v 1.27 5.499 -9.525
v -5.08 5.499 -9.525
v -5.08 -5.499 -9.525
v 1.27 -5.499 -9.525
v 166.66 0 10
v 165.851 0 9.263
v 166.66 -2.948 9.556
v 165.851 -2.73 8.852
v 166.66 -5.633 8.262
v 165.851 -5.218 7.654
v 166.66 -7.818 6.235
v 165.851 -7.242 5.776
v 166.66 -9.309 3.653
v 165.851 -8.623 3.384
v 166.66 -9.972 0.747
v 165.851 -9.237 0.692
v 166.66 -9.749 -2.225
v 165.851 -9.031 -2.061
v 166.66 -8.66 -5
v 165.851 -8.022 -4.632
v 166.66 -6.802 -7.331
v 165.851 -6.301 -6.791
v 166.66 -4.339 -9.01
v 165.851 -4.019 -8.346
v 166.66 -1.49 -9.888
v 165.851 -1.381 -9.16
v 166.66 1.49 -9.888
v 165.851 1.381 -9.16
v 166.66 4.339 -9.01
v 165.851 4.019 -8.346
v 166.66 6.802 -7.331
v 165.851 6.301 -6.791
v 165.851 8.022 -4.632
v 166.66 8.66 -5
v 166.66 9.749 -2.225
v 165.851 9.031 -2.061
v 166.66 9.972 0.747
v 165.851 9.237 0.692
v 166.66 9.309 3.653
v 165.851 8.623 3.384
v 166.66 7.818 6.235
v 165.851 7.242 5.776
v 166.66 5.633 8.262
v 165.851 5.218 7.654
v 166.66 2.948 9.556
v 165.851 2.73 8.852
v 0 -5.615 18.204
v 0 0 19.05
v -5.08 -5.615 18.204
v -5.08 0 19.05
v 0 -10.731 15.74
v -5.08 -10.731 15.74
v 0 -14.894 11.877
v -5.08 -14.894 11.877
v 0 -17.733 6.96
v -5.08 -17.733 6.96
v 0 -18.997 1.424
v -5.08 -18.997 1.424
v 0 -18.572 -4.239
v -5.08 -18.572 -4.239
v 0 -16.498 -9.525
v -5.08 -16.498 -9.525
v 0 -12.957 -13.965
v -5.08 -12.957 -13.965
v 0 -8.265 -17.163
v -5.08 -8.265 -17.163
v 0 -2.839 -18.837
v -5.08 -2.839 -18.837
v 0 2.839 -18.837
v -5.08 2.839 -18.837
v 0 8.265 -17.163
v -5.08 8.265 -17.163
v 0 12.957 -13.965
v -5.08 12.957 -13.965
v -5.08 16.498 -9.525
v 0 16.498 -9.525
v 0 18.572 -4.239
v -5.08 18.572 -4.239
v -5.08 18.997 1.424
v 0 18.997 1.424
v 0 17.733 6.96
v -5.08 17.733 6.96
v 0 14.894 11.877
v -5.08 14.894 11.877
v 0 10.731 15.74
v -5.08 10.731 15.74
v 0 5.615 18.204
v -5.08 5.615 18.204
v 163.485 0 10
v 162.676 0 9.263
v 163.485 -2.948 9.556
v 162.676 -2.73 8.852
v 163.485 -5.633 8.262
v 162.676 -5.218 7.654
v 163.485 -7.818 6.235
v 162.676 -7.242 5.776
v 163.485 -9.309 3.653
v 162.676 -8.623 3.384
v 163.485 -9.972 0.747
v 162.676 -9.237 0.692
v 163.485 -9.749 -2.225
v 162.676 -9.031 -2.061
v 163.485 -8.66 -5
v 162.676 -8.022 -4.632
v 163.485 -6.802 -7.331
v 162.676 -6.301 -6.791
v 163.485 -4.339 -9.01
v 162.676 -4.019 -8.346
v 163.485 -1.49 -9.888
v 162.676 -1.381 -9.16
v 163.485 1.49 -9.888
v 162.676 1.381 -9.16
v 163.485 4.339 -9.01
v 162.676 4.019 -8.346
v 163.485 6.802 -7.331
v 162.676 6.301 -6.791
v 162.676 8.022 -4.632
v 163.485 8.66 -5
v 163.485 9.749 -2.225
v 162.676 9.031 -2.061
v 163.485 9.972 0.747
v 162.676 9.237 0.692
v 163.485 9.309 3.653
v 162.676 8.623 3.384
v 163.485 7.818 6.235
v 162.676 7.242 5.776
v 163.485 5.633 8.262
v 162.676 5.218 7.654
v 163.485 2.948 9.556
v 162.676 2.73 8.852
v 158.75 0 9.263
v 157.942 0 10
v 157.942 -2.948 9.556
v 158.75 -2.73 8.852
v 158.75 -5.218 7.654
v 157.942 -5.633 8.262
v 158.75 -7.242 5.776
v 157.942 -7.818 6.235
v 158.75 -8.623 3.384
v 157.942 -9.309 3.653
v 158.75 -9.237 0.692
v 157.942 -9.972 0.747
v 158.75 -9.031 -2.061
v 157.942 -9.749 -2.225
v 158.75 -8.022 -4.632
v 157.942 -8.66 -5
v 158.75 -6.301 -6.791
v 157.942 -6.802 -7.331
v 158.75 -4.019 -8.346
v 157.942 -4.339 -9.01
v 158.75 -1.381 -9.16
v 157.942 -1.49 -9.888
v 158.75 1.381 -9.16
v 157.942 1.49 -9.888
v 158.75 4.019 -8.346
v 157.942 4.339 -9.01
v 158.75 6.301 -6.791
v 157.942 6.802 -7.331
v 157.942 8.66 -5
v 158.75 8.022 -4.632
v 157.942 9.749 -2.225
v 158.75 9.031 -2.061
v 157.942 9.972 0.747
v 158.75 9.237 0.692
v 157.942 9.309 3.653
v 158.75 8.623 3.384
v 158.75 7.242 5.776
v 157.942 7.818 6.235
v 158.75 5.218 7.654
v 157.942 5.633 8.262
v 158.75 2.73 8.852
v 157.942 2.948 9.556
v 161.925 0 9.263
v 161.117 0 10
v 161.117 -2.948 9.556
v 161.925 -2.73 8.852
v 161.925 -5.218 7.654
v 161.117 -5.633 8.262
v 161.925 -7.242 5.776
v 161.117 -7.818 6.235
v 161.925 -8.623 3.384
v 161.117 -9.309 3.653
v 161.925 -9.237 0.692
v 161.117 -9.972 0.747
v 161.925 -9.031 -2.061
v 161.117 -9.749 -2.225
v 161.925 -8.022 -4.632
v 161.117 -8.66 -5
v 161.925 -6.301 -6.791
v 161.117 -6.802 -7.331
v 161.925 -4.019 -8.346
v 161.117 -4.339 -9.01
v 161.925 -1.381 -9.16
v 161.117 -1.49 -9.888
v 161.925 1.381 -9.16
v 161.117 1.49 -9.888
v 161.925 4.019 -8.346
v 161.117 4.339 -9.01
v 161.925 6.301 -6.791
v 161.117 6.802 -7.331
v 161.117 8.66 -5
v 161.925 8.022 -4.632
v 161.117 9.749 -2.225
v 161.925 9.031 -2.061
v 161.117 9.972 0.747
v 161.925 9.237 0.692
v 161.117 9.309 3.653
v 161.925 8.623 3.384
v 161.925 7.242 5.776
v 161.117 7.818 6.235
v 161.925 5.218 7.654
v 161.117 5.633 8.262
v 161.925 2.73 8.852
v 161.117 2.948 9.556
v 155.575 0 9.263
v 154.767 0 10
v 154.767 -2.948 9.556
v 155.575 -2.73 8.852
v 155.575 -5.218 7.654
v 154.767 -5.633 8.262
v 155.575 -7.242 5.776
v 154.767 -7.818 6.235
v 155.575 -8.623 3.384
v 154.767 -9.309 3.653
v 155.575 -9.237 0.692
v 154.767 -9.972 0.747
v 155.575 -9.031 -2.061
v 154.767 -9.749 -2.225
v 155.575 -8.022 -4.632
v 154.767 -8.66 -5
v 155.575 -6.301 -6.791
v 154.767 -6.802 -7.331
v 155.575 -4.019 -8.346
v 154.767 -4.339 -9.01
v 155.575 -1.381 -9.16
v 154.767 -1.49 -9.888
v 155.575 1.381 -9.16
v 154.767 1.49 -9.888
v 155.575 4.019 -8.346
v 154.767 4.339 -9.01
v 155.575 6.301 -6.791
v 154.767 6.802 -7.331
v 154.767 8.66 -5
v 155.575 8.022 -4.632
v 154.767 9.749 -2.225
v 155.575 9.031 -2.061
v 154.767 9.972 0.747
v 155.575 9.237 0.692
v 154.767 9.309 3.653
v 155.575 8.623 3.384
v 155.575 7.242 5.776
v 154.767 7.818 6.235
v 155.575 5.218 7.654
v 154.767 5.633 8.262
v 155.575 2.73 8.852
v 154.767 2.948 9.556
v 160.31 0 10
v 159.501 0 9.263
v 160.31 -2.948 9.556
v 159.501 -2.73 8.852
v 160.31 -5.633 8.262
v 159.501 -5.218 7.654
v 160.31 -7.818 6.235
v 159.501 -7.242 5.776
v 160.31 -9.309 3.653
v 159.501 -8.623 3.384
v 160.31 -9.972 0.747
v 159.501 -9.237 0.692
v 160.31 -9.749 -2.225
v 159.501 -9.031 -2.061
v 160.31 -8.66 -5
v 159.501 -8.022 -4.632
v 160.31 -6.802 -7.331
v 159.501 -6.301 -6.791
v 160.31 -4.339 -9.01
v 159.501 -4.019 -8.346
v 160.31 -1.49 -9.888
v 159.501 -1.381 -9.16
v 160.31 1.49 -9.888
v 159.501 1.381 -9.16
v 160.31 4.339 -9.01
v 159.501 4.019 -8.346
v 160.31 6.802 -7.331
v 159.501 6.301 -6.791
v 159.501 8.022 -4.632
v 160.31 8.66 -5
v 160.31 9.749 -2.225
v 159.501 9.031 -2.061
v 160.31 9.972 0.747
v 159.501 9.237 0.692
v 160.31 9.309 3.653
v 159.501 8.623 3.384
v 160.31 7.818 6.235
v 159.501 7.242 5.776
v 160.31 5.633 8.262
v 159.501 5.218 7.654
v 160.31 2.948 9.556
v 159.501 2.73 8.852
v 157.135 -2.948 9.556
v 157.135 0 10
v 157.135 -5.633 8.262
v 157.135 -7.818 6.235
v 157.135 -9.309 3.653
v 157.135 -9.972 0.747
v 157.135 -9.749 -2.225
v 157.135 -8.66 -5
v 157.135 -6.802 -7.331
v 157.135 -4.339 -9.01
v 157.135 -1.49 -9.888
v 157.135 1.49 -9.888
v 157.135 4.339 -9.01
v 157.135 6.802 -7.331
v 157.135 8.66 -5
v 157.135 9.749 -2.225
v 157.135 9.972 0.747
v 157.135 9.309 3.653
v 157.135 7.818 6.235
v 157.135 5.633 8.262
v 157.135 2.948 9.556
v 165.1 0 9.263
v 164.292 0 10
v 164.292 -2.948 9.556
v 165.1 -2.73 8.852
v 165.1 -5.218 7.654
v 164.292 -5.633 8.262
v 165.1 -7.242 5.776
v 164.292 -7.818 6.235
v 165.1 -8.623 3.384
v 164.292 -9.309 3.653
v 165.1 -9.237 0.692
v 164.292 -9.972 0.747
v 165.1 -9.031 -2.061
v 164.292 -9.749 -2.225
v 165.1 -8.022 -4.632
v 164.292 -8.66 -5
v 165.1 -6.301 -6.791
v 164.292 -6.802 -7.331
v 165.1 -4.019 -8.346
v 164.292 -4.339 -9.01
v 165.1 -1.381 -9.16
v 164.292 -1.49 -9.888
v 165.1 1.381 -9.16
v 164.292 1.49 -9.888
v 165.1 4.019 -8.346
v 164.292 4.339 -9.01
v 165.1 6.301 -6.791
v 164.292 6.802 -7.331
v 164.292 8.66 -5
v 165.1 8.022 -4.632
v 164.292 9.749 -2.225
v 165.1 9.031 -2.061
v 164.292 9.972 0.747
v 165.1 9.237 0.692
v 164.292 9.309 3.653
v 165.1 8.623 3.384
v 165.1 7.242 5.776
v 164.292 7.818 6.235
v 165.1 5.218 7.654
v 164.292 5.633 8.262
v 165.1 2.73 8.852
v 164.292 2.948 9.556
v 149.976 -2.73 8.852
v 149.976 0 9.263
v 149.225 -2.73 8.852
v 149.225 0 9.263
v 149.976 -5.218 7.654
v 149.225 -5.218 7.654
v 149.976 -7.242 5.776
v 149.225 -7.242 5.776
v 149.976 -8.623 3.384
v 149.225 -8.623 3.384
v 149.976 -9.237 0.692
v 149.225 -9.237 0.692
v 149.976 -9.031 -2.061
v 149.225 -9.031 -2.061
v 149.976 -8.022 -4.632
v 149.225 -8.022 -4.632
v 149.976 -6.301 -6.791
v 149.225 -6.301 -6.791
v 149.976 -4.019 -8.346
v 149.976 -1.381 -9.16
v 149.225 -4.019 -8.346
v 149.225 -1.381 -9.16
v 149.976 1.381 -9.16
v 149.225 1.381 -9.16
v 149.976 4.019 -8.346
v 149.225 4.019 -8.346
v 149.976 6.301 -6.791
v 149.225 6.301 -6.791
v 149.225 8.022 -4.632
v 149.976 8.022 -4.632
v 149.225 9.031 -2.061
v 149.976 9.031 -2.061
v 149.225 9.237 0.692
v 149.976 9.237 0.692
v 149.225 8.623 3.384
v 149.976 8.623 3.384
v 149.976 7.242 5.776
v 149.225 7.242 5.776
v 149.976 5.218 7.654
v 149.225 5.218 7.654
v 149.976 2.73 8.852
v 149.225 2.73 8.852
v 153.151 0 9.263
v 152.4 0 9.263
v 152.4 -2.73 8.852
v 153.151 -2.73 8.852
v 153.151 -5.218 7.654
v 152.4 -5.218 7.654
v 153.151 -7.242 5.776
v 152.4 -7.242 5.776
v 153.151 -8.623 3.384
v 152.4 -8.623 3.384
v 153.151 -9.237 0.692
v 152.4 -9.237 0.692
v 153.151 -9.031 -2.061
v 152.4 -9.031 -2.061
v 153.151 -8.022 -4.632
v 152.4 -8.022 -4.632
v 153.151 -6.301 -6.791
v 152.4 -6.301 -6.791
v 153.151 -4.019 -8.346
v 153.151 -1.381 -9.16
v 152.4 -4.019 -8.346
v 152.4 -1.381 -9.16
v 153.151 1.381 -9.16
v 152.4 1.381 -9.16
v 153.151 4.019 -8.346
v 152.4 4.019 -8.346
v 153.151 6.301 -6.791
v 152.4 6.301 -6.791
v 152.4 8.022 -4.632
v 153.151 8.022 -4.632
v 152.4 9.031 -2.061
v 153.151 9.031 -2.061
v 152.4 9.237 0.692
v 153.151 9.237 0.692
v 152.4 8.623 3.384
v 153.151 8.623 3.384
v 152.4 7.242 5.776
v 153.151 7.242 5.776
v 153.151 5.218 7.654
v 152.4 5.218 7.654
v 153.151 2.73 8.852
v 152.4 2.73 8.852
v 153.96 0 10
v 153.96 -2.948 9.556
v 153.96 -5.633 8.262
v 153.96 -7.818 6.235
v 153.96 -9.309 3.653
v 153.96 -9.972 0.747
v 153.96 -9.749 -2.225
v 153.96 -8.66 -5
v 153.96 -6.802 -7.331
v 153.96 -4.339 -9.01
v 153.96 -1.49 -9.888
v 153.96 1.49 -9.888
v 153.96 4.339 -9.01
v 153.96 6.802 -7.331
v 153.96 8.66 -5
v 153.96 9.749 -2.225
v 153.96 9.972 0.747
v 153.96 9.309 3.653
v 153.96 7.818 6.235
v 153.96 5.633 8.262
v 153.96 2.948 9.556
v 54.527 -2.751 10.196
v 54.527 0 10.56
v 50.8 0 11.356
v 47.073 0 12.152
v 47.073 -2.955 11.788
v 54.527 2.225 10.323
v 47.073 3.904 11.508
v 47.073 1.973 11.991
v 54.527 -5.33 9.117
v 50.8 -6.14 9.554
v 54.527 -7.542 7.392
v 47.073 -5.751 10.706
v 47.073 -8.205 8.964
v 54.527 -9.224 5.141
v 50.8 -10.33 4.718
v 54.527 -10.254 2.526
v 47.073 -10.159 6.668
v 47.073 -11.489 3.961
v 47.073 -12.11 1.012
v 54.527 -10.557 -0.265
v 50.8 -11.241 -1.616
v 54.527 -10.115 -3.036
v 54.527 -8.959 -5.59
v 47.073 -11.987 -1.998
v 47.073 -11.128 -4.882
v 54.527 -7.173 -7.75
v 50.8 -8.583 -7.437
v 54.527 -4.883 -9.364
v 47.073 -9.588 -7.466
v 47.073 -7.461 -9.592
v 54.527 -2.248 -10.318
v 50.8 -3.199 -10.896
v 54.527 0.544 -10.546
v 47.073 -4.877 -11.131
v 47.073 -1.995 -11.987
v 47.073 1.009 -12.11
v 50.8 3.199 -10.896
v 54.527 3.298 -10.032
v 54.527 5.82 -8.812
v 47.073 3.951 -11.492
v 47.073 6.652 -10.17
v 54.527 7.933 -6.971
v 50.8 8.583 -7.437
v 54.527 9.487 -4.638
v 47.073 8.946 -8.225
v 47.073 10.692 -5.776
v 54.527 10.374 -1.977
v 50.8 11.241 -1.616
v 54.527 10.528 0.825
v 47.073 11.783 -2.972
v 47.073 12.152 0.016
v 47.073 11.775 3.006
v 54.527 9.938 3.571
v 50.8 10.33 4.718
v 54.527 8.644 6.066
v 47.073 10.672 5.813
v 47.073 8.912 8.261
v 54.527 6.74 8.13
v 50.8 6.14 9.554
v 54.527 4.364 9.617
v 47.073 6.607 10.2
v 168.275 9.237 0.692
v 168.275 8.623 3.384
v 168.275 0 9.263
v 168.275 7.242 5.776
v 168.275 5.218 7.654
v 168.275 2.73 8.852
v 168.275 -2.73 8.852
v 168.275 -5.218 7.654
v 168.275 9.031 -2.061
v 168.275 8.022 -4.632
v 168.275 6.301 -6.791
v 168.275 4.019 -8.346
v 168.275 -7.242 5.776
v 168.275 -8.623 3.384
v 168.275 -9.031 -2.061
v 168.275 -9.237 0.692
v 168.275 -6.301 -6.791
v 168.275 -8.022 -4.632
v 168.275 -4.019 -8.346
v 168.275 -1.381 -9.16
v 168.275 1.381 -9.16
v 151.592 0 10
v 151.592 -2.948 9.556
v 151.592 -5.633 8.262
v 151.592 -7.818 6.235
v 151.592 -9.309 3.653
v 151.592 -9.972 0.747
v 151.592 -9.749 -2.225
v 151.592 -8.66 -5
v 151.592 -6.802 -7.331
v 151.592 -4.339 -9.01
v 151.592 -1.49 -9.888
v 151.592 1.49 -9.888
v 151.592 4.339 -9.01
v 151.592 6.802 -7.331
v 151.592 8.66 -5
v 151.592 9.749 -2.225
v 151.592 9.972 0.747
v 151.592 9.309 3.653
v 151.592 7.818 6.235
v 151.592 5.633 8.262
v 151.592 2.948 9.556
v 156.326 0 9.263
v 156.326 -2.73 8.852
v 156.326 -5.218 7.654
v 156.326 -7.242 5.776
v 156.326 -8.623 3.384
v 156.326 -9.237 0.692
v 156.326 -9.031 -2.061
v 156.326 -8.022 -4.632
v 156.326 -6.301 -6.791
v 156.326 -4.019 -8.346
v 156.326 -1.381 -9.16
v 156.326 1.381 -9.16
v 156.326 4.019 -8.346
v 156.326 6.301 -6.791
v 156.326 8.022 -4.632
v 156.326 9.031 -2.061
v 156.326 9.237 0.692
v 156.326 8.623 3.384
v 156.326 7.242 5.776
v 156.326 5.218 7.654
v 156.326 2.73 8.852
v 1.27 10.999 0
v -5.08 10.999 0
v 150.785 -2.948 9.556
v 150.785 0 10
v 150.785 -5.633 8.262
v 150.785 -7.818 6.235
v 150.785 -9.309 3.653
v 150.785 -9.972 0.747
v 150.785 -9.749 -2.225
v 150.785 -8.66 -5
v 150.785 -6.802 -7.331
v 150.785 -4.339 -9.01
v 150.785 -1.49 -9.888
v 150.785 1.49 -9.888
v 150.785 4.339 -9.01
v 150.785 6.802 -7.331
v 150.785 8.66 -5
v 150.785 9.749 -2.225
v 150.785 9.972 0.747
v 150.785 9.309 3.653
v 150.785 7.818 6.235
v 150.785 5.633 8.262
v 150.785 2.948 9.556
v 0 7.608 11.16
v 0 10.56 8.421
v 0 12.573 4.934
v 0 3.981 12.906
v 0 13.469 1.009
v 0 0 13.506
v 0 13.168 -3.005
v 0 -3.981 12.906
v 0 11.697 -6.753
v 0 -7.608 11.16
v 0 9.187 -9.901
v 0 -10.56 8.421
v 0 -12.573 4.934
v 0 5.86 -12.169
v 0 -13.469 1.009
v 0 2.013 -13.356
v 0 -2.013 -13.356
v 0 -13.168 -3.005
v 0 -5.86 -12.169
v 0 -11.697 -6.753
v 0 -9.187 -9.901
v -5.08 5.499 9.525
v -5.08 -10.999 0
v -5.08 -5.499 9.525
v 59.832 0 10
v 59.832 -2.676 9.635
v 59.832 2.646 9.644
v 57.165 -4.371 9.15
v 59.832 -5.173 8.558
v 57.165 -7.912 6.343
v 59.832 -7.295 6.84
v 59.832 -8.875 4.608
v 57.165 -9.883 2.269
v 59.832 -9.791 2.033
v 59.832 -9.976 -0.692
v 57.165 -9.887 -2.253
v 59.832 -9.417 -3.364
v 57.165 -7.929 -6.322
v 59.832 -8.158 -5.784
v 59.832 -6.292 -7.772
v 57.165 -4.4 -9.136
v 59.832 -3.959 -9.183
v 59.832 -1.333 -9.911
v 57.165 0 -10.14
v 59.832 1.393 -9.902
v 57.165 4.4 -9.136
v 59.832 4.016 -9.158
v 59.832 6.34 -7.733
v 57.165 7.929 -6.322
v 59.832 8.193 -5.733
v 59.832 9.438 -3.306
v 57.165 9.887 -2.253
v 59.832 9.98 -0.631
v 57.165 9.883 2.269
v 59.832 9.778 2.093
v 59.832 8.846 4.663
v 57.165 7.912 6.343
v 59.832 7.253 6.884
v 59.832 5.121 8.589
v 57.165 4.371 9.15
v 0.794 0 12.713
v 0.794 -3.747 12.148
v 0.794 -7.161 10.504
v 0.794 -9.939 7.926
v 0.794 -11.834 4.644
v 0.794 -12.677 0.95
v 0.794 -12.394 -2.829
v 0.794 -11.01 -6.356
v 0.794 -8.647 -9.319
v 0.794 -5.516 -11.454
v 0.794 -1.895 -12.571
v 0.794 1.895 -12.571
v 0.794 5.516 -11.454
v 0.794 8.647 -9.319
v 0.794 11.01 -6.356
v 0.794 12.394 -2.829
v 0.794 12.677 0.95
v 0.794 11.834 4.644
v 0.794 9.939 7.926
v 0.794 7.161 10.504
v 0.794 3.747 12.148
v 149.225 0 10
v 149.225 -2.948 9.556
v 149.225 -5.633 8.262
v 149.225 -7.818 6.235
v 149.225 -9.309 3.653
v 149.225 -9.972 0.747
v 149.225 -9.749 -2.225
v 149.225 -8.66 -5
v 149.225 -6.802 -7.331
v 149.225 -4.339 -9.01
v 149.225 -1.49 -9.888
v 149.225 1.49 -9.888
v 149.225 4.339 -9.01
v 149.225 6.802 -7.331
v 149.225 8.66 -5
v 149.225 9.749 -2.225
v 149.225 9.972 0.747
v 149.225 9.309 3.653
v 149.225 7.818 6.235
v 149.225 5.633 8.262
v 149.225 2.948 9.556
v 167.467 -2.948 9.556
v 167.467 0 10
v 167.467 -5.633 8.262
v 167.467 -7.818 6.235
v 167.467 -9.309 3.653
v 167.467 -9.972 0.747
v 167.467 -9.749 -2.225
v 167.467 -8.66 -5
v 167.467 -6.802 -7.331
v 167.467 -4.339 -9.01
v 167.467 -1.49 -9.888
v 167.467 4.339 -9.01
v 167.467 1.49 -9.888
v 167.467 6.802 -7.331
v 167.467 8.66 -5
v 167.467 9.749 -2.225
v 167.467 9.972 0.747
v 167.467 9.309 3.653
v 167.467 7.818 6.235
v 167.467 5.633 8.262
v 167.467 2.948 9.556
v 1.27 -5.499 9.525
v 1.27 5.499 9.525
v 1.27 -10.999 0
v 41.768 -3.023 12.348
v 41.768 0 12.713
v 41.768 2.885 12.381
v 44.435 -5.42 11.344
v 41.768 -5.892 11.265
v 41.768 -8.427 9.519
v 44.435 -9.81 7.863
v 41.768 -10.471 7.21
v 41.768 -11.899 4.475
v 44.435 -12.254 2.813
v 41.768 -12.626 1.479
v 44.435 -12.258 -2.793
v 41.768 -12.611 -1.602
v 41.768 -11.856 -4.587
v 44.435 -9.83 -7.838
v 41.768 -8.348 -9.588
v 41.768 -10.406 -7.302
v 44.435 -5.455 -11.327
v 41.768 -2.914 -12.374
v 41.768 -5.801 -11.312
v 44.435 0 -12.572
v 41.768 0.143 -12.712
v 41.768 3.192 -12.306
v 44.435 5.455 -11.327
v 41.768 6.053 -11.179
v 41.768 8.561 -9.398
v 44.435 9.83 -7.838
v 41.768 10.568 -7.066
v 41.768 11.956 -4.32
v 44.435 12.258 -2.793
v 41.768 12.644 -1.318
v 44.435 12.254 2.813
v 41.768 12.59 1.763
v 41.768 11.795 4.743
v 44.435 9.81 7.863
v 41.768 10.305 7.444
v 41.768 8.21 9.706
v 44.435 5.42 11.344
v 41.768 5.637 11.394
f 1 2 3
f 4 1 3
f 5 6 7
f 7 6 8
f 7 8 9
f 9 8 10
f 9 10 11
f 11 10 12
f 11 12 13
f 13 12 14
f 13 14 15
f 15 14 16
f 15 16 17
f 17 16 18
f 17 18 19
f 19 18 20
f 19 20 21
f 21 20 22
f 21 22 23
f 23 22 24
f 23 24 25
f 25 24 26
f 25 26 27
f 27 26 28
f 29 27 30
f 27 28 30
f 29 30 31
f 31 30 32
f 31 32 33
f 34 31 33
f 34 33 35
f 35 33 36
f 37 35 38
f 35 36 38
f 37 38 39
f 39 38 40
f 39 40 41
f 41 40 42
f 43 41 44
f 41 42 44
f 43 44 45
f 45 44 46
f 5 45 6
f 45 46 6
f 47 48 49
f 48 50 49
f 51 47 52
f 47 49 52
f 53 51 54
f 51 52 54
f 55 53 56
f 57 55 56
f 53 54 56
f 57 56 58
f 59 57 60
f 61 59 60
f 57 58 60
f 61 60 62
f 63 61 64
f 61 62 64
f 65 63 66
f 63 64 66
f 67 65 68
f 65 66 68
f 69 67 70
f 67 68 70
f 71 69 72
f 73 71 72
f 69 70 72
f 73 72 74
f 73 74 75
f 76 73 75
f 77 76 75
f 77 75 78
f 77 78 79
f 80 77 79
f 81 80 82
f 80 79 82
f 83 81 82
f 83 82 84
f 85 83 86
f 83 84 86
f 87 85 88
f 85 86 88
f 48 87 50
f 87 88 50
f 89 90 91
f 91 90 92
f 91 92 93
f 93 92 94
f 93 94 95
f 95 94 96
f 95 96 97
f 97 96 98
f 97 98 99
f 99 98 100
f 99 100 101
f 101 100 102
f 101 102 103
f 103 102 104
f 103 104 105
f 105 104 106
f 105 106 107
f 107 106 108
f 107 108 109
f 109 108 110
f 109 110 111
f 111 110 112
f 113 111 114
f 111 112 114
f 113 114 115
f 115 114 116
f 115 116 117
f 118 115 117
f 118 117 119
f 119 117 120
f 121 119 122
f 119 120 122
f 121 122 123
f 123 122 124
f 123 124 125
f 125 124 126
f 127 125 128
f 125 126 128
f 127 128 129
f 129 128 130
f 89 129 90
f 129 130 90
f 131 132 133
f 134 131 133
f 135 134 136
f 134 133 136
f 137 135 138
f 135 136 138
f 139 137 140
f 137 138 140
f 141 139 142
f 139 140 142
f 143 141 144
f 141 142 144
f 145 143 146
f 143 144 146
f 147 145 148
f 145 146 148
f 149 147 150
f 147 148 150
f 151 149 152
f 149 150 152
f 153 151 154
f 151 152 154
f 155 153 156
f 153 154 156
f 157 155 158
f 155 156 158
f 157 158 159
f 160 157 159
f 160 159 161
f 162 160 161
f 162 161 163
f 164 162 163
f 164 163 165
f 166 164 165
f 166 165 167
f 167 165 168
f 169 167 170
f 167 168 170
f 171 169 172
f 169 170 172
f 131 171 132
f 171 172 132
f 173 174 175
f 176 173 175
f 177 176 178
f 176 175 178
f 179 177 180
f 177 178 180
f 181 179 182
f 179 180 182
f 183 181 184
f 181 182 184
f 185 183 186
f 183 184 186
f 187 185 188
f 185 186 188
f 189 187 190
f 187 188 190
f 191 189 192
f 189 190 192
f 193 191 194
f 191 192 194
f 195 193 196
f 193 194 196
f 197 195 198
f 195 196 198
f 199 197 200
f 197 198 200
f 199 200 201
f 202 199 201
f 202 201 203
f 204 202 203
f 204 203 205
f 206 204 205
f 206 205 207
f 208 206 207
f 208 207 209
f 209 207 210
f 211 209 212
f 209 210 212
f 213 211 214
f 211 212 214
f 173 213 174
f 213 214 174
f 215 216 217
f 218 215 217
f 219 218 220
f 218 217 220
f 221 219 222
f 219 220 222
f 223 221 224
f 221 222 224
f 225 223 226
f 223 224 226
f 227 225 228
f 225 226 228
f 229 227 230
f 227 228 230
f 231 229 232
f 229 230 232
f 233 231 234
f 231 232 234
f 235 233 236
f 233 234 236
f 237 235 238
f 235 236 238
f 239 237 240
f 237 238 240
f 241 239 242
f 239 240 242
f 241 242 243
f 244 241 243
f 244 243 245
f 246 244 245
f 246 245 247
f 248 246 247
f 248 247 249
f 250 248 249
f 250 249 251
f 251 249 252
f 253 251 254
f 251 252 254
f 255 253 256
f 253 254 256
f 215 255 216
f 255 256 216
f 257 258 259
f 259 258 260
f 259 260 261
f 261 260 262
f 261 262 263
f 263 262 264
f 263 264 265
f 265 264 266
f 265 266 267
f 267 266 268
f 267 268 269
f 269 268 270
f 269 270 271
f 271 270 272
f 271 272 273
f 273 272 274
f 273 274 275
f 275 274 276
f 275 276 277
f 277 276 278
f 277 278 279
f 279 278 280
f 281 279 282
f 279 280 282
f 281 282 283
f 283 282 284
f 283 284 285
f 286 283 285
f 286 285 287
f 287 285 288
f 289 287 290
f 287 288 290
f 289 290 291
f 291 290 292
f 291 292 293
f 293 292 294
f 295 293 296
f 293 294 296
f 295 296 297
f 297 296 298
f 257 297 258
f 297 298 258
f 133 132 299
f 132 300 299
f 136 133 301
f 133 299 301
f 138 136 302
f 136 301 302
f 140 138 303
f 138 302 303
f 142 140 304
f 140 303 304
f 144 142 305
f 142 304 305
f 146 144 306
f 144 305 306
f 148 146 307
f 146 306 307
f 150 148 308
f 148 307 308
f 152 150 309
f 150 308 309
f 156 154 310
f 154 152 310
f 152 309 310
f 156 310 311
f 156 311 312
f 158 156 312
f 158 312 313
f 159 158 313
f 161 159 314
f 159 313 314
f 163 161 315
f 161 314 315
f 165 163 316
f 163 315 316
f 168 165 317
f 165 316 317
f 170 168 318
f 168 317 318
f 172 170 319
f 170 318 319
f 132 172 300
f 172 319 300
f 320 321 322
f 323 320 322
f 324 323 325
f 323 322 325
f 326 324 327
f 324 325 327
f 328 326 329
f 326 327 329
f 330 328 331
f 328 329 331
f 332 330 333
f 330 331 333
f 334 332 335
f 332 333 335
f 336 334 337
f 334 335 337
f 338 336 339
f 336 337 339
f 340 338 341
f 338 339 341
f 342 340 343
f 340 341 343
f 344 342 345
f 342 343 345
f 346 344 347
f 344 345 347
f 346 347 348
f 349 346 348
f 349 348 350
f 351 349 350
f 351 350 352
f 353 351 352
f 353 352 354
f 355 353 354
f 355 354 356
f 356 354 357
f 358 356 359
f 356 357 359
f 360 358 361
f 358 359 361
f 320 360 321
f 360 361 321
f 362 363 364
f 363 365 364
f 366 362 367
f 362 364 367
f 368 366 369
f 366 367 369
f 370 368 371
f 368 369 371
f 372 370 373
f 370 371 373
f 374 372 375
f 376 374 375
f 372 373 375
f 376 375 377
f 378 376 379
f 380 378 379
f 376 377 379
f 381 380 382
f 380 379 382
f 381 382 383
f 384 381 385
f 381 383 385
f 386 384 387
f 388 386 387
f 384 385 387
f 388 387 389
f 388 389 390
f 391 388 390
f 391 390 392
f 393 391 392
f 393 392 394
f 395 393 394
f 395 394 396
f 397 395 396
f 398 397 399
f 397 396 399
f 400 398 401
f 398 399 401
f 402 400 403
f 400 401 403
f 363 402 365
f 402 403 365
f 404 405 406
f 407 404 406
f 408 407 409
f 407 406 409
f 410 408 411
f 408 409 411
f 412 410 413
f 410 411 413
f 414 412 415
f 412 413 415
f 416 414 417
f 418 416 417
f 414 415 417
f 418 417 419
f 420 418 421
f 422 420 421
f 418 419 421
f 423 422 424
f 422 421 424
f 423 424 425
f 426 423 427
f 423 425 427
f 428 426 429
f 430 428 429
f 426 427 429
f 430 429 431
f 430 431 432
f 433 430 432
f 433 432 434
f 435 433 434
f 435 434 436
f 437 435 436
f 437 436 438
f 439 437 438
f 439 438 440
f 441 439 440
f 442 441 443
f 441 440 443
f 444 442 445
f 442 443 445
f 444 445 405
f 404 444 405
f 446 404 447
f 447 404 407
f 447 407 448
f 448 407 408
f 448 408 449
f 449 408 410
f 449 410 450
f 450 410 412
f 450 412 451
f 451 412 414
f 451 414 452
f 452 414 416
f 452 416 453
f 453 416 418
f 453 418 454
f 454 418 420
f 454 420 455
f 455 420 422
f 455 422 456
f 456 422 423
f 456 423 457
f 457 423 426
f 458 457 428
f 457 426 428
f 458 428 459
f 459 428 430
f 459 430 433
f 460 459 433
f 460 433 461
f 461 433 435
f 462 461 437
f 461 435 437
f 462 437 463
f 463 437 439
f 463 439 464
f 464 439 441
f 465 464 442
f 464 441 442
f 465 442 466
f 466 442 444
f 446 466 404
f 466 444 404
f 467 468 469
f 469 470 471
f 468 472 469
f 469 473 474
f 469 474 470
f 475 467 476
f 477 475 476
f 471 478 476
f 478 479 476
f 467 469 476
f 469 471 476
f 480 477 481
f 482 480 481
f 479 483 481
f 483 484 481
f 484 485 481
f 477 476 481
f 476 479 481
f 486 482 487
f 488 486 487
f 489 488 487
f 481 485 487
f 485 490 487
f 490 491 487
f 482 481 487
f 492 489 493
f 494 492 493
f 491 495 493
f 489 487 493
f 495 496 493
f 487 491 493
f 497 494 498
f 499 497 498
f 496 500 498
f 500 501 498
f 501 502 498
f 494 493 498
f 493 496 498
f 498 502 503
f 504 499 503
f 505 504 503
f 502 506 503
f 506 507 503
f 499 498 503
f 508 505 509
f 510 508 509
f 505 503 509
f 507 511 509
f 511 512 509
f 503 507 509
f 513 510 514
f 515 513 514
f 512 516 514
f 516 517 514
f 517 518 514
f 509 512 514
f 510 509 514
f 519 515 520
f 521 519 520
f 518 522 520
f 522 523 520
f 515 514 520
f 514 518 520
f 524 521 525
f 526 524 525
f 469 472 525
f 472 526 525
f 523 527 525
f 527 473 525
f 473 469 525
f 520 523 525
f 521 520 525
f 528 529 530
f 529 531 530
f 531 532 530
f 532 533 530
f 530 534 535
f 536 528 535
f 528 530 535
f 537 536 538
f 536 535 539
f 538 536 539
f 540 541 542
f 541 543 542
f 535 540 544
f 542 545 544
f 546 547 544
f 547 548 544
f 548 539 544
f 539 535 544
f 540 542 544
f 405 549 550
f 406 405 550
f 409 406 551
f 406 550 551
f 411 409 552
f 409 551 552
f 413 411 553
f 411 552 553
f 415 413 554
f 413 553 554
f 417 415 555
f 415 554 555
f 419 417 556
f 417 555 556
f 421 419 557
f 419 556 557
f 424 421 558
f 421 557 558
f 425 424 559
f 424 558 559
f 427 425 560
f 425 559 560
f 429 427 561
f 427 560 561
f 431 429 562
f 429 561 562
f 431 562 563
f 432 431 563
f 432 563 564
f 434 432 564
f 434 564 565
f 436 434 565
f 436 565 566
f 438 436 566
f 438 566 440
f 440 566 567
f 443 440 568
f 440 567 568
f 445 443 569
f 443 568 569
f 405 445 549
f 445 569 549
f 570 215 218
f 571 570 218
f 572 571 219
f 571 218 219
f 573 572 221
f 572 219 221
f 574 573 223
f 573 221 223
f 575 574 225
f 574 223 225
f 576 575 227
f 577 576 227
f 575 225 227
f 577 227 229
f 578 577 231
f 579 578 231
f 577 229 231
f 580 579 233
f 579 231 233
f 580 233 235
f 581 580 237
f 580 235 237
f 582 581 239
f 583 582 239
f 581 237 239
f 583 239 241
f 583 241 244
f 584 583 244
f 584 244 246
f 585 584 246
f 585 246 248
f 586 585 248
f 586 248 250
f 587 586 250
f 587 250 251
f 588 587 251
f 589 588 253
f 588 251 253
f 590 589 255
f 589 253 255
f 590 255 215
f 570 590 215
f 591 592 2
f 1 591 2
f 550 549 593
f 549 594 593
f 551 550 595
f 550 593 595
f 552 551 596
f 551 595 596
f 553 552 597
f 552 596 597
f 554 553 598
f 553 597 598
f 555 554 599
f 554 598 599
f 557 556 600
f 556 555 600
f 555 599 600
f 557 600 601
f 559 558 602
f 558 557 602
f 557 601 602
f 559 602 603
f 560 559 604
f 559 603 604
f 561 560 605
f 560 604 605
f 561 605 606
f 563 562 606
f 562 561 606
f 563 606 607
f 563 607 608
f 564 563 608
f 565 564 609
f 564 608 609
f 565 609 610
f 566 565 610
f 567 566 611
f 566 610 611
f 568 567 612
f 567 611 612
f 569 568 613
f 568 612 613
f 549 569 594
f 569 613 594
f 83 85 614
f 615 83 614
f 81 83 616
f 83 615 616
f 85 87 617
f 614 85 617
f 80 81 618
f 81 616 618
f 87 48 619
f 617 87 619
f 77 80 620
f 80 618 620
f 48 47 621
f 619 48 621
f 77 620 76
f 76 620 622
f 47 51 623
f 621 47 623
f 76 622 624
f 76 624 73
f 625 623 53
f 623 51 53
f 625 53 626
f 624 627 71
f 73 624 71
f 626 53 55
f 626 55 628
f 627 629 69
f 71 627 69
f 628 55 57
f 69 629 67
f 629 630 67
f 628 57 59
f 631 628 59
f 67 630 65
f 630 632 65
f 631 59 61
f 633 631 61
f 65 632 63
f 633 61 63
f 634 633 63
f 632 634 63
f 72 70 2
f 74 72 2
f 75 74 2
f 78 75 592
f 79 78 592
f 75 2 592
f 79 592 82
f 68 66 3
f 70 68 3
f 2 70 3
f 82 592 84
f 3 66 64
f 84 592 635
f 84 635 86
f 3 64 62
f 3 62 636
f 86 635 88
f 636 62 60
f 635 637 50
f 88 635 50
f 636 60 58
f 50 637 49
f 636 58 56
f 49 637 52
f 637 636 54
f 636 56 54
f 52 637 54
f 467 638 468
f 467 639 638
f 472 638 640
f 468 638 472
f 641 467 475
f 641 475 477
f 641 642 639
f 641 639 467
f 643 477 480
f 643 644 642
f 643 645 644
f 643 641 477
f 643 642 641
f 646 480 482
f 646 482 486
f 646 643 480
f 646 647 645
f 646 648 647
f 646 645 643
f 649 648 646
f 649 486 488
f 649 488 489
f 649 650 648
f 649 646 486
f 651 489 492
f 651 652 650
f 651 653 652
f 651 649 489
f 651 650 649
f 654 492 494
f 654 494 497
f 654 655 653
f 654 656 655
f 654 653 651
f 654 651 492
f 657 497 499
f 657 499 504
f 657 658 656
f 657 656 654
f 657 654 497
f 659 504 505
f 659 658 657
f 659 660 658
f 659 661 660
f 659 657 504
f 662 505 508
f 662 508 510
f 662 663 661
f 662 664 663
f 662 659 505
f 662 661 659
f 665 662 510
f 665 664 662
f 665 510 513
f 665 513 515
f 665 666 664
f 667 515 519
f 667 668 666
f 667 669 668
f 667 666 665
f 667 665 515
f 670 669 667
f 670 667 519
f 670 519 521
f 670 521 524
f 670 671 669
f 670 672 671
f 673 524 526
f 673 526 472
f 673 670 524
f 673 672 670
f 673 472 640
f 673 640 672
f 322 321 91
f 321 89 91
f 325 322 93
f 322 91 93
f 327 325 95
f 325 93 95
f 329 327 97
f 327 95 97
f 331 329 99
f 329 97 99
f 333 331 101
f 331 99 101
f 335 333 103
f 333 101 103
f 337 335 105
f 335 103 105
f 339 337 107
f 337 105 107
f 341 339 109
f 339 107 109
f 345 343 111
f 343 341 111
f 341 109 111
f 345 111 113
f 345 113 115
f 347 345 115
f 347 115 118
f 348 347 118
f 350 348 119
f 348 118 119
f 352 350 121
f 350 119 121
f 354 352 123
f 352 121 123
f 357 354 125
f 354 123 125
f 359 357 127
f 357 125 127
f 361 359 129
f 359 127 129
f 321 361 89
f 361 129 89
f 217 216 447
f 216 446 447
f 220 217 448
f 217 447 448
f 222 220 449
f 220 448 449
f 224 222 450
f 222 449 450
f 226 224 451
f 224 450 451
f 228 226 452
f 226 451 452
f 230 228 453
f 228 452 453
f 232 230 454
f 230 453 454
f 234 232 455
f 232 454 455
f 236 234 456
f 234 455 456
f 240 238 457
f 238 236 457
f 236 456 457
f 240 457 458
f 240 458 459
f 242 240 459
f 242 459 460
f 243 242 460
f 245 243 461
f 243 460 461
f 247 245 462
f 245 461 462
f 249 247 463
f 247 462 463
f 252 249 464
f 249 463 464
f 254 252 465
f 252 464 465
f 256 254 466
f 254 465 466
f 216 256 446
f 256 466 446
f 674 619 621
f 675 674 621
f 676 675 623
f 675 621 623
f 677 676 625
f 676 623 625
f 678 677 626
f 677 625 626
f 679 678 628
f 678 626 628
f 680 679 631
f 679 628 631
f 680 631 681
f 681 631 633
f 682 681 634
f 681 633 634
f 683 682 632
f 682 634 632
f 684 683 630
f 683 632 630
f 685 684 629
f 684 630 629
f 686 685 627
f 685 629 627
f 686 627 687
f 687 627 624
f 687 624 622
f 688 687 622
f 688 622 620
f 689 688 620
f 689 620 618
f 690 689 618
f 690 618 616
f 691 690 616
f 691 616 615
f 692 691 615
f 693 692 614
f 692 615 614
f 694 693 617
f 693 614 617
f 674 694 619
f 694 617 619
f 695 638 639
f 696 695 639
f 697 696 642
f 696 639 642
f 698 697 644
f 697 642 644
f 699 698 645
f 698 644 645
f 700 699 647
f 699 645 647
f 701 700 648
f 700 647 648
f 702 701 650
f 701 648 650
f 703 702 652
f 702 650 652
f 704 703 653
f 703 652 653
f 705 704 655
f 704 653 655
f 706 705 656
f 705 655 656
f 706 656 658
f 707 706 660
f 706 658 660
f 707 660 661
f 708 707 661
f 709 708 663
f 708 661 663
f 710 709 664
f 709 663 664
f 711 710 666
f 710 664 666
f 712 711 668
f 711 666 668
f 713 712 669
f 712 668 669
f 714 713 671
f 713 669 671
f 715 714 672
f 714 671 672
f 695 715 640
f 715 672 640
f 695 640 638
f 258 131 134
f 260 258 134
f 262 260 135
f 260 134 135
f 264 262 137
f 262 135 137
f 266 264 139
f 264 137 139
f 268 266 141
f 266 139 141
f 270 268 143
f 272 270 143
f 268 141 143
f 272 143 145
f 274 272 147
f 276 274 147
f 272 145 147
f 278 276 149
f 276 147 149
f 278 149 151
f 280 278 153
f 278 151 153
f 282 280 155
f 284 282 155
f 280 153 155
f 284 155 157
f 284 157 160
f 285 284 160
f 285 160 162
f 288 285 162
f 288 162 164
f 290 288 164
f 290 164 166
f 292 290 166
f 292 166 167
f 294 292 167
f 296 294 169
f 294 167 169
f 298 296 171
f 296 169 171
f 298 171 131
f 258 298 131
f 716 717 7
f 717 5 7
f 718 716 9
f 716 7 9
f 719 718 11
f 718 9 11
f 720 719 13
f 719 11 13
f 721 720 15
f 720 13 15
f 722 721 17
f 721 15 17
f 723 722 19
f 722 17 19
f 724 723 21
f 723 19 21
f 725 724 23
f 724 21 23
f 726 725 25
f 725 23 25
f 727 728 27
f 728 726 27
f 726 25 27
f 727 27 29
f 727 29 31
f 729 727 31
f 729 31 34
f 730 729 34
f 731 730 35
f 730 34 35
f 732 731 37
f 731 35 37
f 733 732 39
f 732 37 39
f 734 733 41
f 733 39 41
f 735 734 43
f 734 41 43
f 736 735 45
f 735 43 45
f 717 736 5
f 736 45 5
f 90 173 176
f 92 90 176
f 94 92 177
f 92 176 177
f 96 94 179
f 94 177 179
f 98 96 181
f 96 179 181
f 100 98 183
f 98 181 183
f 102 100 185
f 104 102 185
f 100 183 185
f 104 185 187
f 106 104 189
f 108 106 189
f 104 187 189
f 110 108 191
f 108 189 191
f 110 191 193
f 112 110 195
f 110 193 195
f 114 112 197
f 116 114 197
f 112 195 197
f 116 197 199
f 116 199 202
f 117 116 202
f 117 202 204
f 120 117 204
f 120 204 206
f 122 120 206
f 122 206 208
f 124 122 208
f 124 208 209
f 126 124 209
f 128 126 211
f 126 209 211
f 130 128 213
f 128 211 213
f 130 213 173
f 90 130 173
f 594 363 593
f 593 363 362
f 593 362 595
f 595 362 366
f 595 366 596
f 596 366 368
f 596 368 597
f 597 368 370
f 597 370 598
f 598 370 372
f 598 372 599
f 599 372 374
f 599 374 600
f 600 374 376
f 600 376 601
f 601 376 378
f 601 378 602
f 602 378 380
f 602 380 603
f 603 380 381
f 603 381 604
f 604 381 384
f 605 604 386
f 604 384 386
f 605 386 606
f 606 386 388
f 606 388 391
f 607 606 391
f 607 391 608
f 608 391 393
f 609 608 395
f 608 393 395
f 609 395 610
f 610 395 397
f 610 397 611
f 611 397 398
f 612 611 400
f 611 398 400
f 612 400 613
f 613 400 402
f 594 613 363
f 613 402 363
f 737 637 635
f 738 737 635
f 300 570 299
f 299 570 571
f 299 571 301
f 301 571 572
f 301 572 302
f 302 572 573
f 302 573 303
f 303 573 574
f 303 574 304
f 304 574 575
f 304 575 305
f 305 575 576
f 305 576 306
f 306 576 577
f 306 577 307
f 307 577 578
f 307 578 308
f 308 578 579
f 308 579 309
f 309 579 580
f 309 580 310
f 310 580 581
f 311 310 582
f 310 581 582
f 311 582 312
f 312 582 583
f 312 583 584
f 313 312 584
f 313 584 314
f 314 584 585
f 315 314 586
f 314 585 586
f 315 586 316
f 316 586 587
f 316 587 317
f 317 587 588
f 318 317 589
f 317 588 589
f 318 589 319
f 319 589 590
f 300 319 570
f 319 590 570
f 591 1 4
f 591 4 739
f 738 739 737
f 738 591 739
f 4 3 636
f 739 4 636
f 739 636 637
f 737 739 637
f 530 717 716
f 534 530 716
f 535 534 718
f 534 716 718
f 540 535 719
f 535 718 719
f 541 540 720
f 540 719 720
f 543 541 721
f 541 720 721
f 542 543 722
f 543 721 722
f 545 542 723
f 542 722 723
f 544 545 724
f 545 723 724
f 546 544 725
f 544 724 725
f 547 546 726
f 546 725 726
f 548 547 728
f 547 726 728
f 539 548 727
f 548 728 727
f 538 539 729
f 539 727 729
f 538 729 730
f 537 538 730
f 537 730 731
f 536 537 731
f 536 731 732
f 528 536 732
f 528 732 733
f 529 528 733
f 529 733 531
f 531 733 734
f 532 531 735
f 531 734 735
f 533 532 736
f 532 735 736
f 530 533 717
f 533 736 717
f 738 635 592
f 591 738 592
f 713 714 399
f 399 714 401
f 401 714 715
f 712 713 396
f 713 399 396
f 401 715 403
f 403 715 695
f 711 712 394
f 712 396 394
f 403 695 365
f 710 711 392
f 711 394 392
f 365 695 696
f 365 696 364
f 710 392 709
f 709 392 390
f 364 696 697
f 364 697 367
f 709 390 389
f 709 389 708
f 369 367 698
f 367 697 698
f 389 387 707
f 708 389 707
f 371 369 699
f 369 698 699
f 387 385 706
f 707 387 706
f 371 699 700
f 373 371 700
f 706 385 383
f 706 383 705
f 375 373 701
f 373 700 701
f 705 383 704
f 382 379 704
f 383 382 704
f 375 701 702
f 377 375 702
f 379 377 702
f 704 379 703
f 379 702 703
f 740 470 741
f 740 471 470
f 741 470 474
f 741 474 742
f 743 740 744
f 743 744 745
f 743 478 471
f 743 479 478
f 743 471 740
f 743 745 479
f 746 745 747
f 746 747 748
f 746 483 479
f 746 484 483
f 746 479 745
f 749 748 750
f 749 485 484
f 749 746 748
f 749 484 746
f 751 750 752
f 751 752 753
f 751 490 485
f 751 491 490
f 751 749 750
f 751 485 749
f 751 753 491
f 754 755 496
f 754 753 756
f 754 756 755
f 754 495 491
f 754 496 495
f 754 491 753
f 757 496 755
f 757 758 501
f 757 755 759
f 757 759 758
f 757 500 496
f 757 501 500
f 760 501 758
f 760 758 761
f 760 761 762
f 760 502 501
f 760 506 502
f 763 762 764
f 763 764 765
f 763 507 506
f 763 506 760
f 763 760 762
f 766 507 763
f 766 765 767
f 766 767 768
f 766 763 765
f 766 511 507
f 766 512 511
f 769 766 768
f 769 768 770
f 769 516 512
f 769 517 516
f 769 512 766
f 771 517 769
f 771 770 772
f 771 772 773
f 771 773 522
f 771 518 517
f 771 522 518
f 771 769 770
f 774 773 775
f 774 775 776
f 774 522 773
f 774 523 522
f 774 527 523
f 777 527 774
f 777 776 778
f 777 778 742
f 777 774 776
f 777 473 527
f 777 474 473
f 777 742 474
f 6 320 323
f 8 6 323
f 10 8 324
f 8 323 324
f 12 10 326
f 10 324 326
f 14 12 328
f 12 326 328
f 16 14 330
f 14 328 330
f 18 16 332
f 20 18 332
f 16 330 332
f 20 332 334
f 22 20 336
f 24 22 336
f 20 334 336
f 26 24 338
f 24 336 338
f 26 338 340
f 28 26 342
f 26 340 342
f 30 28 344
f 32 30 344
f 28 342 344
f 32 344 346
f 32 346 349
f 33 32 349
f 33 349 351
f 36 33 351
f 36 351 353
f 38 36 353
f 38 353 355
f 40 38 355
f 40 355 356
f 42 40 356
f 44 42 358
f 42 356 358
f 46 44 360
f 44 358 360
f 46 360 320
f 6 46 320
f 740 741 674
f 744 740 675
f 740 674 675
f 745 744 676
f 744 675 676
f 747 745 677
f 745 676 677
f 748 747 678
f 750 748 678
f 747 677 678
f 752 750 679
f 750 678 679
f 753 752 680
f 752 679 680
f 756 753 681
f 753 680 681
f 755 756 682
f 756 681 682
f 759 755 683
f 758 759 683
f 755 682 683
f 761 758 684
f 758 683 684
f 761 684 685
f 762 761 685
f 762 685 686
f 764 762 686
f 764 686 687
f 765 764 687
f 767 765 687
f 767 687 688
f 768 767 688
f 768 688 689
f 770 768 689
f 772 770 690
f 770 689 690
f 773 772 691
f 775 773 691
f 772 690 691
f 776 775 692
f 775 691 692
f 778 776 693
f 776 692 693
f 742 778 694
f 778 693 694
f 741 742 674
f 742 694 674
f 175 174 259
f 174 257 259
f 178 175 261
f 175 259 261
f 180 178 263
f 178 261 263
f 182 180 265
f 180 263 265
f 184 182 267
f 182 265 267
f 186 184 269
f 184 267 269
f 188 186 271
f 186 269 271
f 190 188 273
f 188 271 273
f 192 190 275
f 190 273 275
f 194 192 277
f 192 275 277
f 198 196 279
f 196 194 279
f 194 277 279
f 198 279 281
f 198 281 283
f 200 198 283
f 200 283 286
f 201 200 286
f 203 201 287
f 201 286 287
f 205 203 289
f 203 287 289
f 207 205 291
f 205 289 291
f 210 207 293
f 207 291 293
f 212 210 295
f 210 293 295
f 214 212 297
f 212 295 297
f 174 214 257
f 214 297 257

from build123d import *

# Parameters (mm, degrees)
LPATTERN1_COUNT    = 6
LPATTERN1_PITCH    = 3.175
CUT_EXTRUDE1_DEPTH = 6.35
FILLET1_R          = 25.4
CHAMFER1_SIZE      = 0.79375


with BuildPart() as part:
    # Sketch2 → Revolve1 (revolve)
    with BuildSketch(Plane.XY):
        Polygon((-5.08, 0), (168.275, 0), (168.275, 10), (57.15, 10), (44.45, 12.7127), (0, 12.7127), (0, 19.05), (-5.08, 19.05), align=None)
    revolve(axis=Axis((-8.585810146, 0, 0), (1, 0, 0)))

    # Sketch3 → Cut-Revolve1 (revolve, cut)
    with BuildSketch(Plane.XY):
        Polygon((168.275, 9.2634), (167.438897849, 10.0254), (166.6875, 10.0254), (165.851397849, 9.2634), (165.1, 9.2634), (165.1, 10.5334), (168.275, 10.5334), align=None)
    cut_revolve1 = revolve(axis=Axis((-8.585810146, 0, 0), (1, 0, 0)), mode=Mode.SUBTRACT)

    # LPattern1: Cut-Revolve1 ×6
    with Locations(*[(-i * LPATTERN1_PITCH, 0, 0) for i in range(1, LPATTERN1_COUNT)]):
        add(cut_revolve1, mode=Mode.SUBTRACT)

    # Sketch4 → Cut-Extrude1 (cut)
    with BuildSketch(Plane.ZY.offset(5.08)):
        Polygon((0, 10.998522628), (-9.525, 5.499261314), (-9.525, -5.499261314), (0, -10.998522628), (9.525, -5.499261314), (9.525, 5.499261314), align=None)
    extrude(amount=-CUT_EXTRUDE1_DEPTH, mode=Mode.SUBTRACT)

    # Fillet1
    fillet1_edges = [part.edges().sort_by_distance(p)[0] for p in [
        (57.15, -10, 0),
        (44.45, -12.7127, 0),
    ]]
    fillet(fillet1_edges, radius=FILLET1_R)

    # Chamfer1
    chamfer1_edges = [part.edges().sort_by_distance(p)[0] for p in [
        (0, -12.7127, 0),
    ]]
    chamfer(chamfer1_edges, length=CHAMFER1_SIZE)


solid = part.part
